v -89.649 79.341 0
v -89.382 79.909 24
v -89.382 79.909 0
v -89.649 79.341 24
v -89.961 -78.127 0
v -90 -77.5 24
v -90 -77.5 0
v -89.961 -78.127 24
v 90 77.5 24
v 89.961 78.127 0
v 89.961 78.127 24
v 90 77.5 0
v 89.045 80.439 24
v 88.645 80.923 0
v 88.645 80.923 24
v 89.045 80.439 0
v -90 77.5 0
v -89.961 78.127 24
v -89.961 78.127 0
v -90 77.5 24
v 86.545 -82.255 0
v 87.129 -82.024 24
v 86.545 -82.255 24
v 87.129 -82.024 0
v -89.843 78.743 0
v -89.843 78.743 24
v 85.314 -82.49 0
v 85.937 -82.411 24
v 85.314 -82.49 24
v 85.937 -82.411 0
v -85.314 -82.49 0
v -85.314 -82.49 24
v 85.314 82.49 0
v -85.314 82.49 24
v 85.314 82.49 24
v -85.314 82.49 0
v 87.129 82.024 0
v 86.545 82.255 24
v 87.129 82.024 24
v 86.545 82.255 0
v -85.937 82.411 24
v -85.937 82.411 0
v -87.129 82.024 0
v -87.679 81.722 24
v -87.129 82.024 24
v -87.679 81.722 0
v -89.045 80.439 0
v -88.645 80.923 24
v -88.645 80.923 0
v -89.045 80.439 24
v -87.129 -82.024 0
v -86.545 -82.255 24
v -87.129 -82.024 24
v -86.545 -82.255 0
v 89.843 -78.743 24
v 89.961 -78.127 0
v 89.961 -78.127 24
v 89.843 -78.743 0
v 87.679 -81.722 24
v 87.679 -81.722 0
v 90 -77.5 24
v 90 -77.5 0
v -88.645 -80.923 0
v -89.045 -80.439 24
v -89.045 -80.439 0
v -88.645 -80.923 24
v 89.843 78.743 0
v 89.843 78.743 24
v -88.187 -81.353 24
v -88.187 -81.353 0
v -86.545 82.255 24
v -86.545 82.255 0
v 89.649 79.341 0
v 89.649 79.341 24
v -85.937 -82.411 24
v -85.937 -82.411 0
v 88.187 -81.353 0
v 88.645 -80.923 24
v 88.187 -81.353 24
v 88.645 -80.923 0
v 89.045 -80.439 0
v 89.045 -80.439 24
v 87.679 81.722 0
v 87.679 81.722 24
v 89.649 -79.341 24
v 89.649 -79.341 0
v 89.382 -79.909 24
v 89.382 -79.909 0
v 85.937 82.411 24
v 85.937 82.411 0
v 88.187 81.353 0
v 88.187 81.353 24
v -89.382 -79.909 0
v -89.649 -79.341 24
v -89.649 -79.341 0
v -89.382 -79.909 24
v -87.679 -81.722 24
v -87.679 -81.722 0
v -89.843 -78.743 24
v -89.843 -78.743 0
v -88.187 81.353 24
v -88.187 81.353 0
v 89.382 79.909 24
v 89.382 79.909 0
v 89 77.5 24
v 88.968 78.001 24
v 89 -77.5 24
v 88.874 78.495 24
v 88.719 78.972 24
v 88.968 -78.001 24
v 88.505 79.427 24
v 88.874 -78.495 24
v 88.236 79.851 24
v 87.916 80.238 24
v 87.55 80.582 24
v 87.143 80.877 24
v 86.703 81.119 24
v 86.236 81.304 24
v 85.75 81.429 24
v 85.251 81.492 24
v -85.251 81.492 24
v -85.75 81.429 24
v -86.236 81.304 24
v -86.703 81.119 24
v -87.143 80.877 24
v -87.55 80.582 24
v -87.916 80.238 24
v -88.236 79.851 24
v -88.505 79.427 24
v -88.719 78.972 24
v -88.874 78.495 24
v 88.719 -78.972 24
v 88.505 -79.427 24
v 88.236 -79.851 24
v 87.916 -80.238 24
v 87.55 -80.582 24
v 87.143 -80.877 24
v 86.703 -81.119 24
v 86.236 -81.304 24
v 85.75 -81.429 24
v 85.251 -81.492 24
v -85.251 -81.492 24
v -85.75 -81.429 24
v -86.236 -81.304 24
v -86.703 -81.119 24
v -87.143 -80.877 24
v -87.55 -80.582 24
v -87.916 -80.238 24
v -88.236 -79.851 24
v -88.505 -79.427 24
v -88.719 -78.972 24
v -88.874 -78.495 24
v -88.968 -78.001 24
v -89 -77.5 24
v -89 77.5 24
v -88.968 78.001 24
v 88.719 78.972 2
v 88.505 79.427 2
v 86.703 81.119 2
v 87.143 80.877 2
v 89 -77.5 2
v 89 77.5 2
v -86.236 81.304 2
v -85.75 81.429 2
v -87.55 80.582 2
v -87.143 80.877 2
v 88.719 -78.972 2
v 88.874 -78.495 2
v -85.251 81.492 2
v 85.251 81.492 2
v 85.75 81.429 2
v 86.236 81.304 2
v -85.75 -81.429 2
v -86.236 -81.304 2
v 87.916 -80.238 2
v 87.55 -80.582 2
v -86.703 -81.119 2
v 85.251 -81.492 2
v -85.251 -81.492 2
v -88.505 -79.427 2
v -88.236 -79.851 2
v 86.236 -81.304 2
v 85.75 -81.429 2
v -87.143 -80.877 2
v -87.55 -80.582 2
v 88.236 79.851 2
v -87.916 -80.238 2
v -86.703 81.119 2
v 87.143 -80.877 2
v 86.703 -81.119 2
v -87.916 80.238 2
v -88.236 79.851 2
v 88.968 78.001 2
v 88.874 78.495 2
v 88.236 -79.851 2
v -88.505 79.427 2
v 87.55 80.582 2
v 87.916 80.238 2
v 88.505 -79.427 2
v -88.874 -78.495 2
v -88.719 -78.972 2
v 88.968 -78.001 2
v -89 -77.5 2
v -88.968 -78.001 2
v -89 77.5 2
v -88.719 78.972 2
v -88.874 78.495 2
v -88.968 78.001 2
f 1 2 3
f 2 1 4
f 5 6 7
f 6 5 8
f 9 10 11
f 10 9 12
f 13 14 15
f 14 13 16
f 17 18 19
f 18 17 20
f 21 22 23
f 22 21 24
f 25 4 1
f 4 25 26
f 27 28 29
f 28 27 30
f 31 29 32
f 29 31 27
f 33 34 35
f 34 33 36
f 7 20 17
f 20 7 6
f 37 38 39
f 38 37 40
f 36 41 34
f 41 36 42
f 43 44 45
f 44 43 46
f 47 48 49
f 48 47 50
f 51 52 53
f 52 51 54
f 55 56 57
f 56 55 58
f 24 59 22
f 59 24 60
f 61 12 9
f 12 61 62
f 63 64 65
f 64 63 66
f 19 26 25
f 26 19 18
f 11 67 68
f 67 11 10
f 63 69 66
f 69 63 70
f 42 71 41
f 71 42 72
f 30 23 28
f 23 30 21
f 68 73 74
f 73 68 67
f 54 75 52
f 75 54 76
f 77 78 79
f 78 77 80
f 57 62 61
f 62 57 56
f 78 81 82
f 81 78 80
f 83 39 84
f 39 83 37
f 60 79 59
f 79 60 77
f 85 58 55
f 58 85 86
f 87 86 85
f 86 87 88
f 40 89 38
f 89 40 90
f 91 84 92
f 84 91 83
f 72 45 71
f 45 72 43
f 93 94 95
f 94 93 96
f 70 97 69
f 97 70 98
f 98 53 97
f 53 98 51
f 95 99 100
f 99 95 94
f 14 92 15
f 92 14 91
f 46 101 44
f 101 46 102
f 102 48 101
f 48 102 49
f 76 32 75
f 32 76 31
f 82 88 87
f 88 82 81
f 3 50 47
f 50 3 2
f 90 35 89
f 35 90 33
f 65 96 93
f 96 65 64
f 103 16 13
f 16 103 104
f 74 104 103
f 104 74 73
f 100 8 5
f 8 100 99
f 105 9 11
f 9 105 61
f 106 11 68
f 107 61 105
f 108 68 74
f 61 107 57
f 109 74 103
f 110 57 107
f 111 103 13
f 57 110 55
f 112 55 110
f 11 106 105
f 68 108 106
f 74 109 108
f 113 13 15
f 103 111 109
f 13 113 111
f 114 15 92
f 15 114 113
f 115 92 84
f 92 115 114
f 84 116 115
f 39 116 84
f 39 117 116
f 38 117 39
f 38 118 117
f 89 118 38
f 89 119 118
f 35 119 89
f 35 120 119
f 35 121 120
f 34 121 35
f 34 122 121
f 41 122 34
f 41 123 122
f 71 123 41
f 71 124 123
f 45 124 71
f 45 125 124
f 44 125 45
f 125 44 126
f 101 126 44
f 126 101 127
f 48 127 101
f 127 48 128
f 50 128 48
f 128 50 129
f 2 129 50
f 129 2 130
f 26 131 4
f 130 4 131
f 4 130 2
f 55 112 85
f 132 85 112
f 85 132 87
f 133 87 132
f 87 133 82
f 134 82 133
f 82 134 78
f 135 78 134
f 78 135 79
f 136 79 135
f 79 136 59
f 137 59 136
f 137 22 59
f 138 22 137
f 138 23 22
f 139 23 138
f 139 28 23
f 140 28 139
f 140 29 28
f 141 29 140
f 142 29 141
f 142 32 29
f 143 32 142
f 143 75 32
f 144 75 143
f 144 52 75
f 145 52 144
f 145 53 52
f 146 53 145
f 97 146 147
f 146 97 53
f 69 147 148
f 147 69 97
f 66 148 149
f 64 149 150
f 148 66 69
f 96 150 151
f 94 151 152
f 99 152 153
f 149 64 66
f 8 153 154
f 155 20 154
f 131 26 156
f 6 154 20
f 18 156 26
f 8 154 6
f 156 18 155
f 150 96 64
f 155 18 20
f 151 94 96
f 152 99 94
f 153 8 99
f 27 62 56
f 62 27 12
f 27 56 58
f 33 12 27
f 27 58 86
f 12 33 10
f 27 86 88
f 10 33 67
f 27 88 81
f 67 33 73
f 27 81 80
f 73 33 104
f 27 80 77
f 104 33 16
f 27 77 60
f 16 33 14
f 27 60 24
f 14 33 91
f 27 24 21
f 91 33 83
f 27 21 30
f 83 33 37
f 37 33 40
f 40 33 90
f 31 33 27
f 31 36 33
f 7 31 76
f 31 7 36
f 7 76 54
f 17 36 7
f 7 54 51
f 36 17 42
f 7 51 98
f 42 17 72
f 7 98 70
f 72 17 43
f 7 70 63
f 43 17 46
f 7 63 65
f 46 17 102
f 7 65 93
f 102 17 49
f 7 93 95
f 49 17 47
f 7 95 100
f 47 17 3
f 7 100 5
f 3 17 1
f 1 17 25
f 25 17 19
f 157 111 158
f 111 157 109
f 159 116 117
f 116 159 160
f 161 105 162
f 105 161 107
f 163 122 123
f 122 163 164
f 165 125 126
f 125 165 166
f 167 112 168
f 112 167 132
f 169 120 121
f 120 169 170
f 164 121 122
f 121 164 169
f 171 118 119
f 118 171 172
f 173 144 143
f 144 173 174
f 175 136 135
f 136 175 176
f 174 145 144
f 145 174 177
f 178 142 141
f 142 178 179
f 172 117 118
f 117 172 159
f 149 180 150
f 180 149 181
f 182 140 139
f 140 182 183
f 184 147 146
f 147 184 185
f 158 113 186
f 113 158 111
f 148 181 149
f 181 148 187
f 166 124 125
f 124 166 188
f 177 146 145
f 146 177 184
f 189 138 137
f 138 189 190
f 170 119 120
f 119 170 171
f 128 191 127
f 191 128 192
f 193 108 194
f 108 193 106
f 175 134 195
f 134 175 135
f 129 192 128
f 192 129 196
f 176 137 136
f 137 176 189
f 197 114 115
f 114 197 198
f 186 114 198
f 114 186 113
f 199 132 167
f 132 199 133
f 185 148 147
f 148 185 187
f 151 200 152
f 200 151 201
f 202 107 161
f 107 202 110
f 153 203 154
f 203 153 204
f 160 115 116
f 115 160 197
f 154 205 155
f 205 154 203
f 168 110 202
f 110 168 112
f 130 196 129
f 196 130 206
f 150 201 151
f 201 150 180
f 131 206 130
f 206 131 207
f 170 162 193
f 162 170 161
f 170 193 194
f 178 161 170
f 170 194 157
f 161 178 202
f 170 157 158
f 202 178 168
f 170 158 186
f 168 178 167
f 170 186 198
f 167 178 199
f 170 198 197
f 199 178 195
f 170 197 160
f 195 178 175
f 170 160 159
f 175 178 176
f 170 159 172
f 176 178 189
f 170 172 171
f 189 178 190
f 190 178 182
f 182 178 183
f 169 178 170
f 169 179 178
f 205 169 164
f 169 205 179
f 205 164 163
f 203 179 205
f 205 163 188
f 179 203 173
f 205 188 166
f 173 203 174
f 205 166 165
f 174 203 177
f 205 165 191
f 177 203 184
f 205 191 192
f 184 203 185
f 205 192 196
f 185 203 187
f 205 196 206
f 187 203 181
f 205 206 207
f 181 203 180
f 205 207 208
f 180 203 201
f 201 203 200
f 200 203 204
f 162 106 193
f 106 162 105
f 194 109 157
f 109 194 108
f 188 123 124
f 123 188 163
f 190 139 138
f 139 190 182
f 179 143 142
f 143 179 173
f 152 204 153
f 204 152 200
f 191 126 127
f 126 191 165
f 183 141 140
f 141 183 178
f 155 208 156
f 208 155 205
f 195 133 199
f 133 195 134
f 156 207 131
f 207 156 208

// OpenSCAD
$fn = 50;


difference() {
	union() {
		hull() {
			translate(v = [-85.0000000000, 77.5000000000, 0]) {
				cylinder(h = 24, r = 5);
			}
			translate(v = [85.0000000000, 77.5000000000, 0]) {
				cylinder(h = 24, r = 5);
			}
			translate(v = [-85.0000000000, -77.5000000000, 0]) {
				cylinder(h = 24, r = 5);
			}
			translate(v = [85.0000000000, -77.5000000000, 0]) {
				cylinder(h = 24, r = 5);
			}
		}
	}
	union() {
		translate(v = [0, 0, 2]) {
			hull() {
				translate(v = [-85.0000000000, 77.5000000000, 0]) {
					cylinder(h = 22, r = 4);
				}
				translate(v = [85.0000000000, 77.5000000000, 0]) {
					cylinder(h = 22, r = 4);
				}
				translate(v = [-85.0000000000, -77.5000000000, 0]) {
					cylinder(h = 22, r = 4);
				}
				translate(v = [85.0000000000, -77.5000000000, 0]) {
					cylinder(h = 22, r = 4);
				}
			}
		}
	}
}
